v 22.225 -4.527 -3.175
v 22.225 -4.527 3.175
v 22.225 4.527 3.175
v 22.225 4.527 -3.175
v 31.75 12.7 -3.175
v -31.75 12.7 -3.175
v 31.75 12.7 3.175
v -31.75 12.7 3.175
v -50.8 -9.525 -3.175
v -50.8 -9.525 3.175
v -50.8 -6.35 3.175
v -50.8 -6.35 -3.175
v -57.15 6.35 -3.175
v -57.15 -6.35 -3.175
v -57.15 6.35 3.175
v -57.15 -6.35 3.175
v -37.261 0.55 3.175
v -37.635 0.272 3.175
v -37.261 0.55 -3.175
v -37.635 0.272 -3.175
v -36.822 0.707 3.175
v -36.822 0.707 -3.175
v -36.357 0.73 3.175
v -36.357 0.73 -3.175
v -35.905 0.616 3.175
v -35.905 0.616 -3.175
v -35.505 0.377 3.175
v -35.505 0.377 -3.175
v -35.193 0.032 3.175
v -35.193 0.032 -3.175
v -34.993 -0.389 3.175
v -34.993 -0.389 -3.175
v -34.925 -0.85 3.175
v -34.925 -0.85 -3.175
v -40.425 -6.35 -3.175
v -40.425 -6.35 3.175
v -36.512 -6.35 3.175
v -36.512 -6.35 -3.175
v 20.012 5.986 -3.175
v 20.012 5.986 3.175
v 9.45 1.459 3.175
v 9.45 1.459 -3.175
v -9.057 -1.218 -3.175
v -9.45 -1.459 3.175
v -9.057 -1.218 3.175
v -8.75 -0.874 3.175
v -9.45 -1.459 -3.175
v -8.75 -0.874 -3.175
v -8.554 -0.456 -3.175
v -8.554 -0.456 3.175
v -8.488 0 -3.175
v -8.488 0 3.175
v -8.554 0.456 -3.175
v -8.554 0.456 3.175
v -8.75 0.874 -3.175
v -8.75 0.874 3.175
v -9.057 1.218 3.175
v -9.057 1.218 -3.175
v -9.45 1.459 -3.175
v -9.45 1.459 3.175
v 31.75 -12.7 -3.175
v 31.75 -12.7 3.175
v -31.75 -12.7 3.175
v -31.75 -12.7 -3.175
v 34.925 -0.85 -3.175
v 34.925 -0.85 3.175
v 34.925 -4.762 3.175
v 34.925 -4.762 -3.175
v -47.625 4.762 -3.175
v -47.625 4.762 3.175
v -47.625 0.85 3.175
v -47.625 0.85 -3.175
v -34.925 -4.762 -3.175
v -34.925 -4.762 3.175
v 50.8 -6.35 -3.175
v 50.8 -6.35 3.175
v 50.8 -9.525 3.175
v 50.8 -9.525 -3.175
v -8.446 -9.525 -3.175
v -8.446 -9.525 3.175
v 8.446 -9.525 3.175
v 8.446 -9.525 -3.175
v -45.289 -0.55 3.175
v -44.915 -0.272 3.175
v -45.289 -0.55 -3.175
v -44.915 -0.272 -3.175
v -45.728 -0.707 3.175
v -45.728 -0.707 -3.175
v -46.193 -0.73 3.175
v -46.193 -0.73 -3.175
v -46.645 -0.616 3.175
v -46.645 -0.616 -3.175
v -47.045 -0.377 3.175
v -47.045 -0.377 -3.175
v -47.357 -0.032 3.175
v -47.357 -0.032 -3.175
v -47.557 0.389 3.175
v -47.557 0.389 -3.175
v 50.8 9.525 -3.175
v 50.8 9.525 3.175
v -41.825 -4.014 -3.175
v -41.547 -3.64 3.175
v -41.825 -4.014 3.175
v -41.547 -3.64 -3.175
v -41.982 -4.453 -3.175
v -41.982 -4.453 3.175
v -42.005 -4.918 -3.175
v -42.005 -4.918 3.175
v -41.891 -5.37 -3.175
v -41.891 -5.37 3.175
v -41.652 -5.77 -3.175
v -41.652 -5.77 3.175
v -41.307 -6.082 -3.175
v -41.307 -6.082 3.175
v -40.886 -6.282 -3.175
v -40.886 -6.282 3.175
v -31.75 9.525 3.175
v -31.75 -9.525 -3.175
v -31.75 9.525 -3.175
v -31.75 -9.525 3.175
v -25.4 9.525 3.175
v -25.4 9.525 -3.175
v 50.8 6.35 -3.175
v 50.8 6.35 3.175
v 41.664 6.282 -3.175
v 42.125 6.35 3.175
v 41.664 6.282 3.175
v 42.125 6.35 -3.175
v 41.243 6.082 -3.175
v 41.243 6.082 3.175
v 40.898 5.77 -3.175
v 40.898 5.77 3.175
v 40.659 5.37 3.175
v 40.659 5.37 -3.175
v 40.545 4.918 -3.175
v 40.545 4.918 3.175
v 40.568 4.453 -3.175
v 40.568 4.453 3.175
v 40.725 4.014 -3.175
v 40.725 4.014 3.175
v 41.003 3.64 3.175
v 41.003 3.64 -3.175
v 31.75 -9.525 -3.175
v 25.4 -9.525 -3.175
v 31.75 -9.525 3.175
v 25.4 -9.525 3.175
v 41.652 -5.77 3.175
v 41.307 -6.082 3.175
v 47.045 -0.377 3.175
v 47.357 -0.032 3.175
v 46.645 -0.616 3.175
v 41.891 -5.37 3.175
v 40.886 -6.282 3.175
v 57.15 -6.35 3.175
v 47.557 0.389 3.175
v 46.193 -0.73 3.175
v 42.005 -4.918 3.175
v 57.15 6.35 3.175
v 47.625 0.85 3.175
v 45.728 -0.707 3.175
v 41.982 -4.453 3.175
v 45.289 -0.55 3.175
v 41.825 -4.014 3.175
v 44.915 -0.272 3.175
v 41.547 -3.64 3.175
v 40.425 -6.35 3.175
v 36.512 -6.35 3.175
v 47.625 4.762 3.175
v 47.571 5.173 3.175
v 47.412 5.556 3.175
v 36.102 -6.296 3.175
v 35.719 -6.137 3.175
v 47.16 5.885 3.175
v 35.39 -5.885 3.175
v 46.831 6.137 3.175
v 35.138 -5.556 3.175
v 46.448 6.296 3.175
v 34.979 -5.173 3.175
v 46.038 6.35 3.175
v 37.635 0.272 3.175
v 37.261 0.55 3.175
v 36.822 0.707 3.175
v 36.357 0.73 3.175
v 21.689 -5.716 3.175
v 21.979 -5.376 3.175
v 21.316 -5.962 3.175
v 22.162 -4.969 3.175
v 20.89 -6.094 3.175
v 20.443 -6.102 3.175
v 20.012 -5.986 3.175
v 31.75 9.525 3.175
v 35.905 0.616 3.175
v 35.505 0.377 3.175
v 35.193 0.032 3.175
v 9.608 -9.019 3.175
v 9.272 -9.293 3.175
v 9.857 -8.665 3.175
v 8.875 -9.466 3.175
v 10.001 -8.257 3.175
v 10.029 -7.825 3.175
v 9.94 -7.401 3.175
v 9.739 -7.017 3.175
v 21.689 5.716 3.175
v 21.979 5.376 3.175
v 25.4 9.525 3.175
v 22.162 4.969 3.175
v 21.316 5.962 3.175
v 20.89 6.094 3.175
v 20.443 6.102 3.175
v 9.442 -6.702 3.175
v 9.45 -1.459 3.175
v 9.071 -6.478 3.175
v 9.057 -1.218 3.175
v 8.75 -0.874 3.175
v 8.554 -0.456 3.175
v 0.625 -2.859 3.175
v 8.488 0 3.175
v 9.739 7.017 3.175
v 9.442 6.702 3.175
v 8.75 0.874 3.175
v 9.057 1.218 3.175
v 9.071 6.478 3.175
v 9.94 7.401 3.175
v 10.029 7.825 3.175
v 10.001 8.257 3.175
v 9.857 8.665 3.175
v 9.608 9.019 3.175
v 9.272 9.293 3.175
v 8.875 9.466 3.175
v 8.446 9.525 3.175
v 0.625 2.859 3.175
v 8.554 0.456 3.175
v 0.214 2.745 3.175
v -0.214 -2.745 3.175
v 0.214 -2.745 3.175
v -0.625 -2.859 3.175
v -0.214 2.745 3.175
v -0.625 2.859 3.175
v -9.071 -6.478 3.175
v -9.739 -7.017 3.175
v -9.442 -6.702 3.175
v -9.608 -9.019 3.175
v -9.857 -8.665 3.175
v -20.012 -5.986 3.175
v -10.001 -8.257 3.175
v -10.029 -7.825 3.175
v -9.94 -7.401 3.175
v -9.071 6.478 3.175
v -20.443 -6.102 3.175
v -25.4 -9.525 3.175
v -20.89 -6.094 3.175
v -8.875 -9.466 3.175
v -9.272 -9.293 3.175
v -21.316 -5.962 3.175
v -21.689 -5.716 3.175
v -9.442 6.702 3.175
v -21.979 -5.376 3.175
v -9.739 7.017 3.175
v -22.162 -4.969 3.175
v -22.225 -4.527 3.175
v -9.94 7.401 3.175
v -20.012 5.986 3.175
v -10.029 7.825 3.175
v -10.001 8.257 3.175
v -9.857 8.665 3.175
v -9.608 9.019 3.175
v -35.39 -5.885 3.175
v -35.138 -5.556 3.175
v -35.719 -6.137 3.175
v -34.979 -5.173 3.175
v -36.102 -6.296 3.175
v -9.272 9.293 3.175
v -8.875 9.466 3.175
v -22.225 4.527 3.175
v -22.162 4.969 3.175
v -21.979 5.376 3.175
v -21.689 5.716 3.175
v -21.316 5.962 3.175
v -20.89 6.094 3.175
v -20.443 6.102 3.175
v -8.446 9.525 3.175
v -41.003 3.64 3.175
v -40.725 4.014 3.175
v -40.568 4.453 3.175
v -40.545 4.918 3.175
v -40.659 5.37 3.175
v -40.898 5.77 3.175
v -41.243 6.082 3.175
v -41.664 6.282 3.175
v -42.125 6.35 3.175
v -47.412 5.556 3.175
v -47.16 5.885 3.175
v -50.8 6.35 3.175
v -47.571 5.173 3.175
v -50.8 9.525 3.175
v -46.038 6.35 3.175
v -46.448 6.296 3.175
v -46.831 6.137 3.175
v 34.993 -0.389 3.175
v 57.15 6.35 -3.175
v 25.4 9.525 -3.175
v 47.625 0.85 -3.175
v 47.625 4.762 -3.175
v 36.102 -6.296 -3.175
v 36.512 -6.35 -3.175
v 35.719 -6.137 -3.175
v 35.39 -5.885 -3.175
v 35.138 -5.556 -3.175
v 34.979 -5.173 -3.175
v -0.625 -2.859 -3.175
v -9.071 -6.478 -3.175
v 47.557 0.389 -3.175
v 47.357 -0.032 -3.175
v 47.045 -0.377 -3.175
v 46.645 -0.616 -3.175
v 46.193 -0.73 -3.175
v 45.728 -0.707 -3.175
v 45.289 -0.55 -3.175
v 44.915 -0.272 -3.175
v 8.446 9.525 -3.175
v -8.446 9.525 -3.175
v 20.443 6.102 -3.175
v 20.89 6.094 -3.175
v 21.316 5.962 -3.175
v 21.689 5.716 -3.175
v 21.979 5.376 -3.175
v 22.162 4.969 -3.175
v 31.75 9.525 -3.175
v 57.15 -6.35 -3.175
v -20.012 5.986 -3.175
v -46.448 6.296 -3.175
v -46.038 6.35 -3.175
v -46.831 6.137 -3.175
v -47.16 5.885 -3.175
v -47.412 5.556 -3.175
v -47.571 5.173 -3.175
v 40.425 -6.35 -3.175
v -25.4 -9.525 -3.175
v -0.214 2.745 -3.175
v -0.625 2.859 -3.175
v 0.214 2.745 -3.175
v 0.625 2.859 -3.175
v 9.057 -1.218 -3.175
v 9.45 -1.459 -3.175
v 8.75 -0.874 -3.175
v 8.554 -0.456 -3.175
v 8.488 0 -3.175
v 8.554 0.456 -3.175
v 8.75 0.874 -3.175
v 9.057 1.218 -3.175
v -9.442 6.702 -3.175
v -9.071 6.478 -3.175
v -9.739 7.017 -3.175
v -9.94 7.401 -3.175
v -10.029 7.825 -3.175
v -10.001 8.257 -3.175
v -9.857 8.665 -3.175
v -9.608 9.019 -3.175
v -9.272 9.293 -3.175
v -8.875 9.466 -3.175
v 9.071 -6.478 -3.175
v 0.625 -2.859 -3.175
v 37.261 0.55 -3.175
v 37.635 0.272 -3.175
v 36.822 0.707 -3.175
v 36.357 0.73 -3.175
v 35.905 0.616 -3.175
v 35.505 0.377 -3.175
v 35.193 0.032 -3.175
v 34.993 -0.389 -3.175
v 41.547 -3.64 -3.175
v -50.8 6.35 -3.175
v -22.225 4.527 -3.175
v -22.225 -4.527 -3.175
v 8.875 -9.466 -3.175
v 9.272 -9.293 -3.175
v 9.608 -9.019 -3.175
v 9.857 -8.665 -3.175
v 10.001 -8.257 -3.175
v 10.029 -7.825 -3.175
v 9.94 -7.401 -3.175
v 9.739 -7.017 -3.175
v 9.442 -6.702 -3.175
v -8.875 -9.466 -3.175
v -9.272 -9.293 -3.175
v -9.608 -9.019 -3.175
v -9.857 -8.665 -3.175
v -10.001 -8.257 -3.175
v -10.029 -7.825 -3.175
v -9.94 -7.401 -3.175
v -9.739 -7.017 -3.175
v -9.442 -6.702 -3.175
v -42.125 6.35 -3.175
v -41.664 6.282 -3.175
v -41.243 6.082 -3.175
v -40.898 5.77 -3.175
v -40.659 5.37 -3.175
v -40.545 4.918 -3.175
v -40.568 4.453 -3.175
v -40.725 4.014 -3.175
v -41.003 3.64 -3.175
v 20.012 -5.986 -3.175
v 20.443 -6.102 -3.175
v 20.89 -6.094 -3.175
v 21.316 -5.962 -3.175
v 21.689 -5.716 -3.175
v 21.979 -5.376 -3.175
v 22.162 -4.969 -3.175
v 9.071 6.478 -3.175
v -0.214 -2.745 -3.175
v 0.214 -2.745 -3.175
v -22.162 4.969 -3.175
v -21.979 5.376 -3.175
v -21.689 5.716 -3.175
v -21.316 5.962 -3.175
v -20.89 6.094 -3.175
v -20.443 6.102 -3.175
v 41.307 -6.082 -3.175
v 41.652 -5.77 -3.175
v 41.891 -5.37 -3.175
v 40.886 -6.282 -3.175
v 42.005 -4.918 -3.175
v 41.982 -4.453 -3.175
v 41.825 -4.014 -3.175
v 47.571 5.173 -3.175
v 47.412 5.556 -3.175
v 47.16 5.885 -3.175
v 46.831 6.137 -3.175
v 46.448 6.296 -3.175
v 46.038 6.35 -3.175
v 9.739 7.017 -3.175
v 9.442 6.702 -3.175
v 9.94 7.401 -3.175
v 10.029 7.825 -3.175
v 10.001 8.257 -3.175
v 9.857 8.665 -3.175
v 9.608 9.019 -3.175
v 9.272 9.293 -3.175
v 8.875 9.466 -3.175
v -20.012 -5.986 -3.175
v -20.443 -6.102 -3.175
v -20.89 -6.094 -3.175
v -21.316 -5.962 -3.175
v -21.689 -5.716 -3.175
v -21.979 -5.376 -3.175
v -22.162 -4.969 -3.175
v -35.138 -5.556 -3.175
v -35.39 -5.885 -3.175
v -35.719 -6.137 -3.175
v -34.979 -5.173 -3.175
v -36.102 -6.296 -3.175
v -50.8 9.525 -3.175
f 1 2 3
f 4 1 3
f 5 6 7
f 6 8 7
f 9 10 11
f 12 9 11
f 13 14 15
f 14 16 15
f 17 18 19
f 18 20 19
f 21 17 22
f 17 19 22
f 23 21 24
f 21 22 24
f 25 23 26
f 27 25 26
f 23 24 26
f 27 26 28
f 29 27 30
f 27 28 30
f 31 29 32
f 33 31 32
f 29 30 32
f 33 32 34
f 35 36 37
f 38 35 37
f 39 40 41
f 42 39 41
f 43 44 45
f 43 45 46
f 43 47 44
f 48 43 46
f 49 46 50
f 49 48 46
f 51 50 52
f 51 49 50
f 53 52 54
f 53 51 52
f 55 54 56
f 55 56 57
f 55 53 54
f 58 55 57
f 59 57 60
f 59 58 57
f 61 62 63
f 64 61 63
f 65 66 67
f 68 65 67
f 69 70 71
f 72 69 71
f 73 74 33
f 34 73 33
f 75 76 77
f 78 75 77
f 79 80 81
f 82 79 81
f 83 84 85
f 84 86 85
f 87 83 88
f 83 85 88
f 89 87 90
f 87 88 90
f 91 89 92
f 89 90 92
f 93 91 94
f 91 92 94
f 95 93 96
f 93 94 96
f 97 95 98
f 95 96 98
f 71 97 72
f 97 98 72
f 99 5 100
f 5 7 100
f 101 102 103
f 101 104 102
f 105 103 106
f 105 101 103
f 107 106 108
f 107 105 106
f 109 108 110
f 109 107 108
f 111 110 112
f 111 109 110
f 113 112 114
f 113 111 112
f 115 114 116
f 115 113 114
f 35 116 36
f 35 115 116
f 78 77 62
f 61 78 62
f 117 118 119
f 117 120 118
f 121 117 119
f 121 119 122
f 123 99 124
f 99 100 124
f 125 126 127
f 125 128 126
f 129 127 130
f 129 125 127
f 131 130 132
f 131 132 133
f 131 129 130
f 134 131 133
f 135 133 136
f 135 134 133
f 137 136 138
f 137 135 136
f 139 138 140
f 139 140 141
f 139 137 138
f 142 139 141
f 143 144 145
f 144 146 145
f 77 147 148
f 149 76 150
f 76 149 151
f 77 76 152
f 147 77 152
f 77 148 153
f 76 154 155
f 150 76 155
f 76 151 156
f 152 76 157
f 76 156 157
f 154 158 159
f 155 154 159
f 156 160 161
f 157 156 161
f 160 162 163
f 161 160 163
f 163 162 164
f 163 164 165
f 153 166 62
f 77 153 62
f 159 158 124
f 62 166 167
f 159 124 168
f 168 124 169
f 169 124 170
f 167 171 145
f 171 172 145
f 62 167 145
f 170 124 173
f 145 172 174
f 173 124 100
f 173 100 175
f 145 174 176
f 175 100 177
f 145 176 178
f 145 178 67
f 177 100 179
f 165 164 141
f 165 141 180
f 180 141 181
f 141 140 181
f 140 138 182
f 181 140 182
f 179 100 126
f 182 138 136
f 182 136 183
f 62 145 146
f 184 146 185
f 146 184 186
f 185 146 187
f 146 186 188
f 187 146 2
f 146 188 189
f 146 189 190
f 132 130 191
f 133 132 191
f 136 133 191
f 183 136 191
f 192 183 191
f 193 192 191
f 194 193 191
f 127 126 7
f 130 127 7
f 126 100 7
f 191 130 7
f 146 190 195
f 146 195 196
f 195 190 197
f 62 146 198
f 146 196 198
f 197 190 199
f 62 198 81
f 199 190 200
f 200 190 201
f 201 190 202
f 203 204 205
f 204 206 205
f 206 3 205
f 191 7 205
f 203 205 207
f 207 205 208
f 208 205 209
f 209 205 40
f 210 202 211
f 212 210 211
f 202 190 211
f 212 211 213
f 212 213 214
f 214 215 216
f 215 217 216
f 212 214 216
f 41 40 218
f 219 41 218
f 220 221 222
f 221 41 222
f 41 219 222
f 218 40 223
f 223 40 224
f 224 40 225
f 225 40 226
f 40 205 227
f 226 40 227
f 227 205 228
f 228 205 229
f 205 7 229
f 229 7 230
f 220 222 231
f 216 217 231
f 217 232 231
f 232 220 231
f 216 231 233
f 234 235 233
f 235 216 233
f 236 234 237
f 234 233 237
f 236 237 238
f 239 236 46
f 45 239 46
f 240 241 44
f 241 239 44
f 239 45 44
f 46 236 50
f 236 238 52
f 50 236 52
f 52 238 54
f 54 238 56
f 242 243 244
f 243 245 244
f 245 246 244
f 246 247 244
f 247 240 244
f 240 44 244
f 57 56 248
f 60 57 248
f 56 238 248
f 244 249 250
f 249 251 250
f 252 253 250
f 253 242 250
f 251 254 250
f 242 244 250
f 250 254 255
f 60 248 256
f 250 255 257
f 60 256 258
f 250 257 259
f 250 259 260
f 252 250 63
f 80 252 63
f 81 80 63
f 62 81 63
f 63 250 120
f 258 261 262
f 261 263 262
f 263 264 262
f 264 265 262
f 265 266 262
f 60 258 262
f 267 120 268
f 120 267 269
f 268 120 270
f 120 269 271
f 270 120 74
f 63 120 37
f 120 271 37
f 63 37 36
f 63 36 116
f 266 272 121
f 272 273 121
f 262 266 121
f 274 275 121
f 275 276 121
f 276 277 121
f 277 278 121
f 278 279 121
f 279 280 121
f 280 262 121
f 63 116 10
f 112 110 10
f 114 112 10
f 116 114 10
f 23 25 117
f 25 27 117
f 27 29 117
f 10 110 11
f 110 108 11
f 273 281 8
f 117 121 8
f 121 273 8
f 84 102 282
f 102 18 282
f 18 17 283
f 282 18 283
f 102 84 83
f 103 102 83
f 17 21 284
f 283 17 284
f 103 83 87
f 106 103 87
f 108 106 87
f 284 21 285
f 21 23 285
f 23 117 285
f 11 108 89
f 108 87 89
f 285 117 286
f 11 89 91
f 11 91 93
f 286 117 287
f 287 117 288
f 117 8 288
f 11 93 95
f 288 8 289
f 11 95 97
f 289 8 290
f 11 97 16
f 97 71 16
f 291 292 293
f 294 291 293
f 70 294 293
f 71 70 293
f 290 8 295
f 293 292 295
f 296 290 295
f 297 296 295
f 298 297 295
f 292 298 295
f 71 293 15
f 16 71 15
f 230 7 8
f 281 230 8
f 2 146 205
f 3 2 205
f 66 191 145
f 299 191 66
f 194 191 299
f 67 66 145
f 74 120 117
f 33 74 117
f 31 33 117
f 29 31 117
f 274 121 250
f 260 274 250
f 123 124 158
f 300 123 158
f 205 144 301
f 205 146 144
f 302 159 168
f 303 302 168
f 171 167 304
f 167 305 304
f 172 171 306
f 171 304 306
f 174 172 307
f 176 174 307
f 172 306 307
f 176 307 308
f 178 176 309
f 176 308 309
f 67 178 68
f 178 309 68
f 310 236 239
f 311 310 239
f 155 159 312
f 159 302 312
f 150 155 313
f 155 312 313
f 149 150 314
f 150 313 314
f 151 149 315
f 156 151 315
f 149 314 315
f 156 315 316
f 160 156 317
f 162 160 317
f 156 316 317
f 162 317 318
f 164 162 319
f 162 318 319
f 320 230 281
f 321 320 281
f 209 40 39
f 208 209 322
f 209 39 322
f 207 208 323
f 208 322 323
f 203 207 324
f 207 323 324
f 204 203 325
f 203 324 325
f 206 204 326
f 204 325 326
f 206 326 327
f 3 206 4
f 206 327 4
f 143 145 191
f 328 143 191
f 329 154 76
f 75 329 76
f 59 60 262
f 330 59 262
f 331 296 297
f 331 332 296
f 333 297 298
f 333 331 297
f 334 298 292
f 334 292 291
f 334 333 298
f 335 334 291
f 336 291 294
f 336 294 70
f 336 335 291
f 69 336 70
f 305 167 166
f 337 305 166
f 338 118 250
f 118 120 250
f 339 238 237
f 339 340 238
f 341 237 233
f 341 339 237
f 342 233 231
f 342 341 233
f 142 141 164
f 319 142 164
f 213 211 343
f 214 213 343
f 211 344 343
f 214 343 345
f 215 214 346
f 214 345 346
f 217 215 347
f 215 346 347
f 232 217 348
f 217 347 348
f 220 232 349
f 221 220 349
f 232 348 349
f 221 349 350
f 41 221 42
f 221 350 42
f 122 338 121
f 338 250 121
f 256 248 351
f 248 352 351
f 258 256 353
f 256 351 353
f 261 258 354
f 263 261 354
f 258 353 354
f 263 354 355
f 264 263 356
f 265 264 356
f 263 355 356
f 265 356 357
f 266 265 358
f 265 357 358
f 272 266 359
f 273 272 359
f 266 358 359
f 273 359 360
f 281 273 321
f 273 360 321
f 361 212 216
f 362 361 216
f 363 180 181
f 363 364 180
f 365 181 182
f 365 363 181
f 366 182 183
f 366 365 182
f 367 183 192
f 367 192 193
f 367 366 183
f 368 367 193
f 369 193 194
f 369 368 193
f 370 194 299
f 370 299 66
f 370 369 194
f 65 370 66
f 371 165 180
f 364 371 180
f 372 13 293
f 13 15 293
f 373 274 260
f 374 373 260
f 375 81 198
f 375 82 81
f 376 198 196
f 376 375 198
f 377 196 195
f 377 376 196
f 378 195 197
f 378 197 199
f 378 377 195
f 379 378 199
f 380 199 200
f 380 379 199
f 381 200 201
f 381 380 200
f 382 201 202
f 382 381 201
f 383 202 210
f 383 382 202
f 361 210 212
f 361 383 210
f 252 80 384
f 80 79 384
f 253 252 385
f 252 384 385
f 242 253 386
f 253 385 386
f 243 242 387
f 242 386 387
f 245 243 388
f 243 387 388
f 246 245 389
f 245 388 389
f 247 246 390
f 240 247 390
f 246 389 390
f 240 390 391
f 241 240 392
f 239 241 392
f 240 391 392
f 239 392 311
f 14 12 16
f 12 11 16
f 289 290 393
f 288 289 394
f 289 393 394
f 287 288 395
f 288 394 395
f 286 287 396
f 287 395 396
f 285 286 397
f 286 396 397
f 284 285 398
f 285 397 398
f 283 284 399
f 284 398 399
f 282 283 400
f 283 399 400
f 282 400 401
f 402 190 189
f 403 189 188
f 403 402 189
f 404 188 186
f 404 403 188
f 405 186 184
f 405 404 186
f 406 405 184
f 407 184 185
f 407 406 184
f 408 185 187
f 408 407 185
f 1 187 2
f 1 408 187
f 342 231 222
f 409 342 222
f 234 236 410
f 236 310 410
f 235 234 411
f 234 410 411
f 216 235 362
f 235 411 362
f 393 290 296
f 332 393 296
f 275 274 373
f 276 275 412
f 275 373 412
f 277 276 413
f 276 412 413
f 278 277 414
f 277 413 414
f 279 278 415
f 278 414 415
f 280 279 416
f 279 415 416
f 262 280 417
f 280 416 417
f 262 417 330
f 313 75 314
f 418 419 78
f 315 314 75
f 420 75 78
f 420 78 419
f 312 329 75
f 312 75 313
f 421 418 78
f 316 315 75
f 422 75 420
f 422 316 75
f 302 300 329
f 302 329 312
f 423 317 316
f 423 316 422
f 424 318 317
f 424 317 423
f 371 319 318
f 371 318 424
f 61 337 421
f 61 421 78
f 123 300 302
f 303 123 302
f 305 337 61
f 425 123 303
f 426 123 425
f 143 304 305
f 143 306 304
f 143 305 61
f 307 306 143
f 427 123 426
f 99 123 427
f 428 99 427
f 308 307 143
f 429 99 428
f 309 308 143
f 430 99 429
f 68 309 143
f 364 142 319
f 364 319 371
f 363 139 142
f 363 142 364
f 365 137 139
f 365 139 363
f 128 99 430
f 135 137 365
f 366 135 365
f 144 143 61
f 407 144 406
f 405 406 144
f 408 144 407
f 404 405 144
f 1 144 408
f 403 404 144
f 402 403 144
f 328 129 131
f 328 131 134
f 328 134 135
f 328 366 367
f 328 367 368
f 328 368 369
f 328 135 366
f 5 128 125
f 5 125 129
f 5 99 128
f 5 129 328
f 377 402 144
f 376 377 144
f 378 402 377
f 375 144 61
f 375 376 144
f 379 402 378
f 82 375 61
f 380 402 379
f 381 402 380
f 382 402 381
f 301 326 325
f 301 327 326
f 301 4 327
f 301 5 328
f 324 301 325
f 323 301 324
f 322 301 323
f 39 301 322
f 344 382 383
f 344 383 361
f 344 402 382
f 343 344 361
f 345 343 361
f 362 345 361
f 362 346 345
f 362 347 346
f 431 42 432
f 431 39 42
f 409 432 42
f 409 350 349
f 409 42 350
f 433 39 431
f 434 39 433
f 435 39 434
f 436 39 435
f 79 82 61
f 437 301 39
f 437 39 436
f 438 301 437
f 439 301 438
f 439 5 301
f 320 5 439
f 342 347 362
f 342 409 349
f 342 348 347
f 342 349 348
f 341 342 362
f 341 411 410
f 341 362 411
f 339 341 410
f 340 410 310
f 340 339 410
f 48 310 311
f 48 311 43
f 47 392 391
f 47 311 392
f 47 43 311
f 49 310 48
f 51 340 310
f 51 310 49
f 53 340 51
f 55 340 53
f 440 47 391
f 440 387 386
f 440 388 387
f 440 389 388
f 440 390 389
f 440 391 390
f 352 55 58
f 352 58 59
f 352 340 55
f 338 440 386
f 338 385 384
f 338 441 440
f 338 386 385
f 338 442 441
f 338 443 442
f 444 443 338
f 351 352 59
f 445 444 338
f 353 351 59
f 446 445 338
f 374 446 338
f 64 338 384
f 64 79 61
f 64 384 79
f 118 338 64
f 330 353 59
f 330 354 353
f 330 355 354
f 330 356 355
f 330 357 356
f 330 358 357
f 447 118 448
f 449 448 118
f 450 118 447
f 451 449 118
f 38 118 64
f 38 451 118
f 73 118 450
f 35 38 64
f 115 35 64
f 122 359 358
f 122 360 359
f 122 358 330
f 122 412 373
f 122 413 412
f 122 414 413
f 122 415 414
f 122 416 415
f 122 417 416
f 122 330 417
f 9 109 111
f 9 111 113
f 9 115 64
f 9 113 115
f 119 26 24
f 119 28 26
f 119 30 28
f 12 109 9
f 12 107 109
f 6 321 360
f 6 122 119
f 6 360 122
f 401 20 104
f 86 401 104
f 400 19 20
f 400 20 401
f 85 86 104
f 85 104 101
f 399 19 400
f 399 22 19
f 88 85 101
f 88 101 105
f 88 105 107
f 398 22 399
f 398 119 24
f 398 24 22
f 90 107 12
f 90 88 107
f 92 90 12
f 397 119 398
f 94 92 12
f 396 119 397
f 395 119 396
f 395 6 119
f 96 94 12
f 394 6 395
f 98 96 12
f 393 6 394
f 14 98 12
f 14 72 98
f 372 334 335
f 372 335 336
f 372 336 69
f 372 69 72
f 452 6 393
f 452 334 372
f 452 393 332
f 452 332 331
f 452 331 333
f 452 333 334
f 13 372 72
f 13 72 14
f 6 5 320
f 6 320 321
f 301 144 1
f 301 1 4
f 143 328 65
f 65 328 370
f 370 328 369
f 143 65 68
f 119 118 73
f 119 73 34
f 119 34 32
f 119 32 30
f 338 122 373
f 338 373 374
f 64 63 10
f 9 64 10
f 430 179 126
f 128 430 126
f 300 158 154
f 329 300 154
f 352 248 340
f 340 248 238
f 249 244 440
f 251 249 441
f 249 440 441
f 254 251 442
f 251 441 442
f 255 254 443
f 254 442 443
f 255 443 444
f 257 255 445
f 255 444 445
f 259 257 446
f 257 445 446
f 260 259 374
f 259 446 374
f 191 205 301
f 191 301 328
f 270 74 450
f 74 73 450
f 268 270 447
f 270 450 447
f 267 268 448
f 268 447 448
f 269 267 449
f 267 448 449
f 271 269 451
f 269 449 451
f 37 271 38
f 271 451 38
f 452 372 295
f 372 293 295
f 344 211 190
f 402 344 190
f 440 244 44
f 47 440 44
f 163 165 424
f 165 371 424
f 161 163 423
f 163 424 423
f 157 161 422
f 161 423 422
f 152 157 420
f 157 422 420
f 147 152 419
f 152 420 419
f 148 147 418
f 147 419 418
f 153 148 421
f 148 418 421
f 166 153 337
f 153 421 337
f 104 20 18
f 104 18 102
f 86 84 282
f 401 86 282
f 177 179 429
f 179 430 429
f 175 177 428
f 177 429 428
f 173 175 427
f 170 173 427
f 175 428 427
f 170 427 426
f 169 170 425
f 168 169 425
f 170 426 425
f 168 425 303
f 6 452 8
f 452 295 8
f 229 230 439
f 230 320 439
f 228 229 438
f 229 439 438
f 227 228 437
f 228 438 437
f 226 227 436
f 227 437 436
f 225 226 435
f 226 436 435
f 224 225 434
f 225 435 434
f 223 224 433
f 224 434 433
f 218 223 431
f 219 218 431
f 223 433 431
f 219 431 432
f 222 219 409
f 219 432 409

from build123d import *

# Parameters (mm, degrees)
SKETCH1_W           = 6.35
SKETCH1_H           = 19.05
BOSS_EXTRUDE1_DEPTH = 3.175
CUT_EXTRUDE1_DEPTH  = 7.35
FILLET1_R           = 1.5875


with BuildPart() as part:
    # Sketch1 → Boss-Extrude1 (new body, symmetric)
    with BuildSketch(Plane.XY):
        Polygon((-50.8, -9.525), (-50.8, -6.35), (-57.15, -6.35), (-57.15, 6.35), (-50.8, 6.35), (-50.8, 9.525), (-31.75, 12.7), (31.75, 12.7), (50.8, 9.525), (50.8, 6.35), (57.15, 6.35), (57.15, -6.35), (50.8, -6.35), (50.8, -9.525), (31.75, -12.7), (-31.75, -12.7), align=None)
        with Locations((-28.575, 0)):
            Rectangle(SKETCH1_W, SKETCH1_H, mode=Mode.SUBTRACT)
        with Locations((28.575, 0)):
            Rectangle(SKETCH1_W, SKETCH1_H, mode=Mode.SUBTRACT)
    extrude(amount=BOSS_EXTRUDE1_DEPTH, both=True)

    # Sketch2 → Cut-Extrude1 (cut, through all)
    with BuildSketch(Plane.XY.offset(3.175)):
        Polygon((-38.292596045, 6.35), (-47.625, 6.35), (-47.625, -2.982403955), align=None)
        Polygon((-34.925, 2.982403955), (-44.257403955, -6.35), (-34.925, -6.35), align=None)
        Polygon((-22.225, -6.934277185), (-6.045019903, 0), (-22.225, 6.934277185), align=None)
        Polygon((-16.179980097, 9.525), (0, 2.590722815), (16.179980097, 9.525), align=None)
        Polygon((6.045019903, 0), (22.225, -6.934277185), (22.225, 6.934277185), align=None)
        Polygon((-16.179980097, -9.525), (16.179980097, -9.525), (0, -2.590722815), align=None)
        Polygon((44.257403955, -6.35), (34.925, 2.982403955), (34.925, -6.35), align=None)
        Polygon((47.625, 6.35), (38.292596045, 6.35), (47.625, -2.982403955), align=None)
    extrude(amount=-CUT_EXTRUDE1_DEPTH, mode=Mode.SUBTRACT)

    # Fillet1
    fillet1_edges = [part.edges().sort_by_distance(p)[0] for p in [
        (16.179980097, 9.525, 0),
        (0, 2.590722815, 0),
        (-16.179980097, 9.525, 0),
        (22.225, 6.934277185, 0),
        (22.225, -6.934277185, 0),
        (6.045019903, 0, 0),
        (-6.045019903, 0, 0),
        (-22.225, -6.934277185, 0),
        (-22.225, 6.934277185, 0),
        (-34.925, 2.982403955, 0),
        (-34.925, -6.35, 0),
        (-44.257403955, -6.35, 0),
        (38.292596045, 6.35, 0),
        (47.625, 6.35, 0),
        (47.625, -2.982403955, 0),
        (44.257403955, -6.35, 0),
        (34.925, -6.35, 0),
        (34.925, 2.982403955, 0),
        (0, -2.590722815, 0),
        (16.179980097, -9.525, 0),
        (-16.179980097, -9.525, 0),
        (-38.292596045, 6.35, 0),
        (-47.625, -2.982403955, 0),
        (-47.625, 6.35, 0),
    ]]
    fillet(fillet1_edges, radius=FILLET1_R)


solid = part.part
